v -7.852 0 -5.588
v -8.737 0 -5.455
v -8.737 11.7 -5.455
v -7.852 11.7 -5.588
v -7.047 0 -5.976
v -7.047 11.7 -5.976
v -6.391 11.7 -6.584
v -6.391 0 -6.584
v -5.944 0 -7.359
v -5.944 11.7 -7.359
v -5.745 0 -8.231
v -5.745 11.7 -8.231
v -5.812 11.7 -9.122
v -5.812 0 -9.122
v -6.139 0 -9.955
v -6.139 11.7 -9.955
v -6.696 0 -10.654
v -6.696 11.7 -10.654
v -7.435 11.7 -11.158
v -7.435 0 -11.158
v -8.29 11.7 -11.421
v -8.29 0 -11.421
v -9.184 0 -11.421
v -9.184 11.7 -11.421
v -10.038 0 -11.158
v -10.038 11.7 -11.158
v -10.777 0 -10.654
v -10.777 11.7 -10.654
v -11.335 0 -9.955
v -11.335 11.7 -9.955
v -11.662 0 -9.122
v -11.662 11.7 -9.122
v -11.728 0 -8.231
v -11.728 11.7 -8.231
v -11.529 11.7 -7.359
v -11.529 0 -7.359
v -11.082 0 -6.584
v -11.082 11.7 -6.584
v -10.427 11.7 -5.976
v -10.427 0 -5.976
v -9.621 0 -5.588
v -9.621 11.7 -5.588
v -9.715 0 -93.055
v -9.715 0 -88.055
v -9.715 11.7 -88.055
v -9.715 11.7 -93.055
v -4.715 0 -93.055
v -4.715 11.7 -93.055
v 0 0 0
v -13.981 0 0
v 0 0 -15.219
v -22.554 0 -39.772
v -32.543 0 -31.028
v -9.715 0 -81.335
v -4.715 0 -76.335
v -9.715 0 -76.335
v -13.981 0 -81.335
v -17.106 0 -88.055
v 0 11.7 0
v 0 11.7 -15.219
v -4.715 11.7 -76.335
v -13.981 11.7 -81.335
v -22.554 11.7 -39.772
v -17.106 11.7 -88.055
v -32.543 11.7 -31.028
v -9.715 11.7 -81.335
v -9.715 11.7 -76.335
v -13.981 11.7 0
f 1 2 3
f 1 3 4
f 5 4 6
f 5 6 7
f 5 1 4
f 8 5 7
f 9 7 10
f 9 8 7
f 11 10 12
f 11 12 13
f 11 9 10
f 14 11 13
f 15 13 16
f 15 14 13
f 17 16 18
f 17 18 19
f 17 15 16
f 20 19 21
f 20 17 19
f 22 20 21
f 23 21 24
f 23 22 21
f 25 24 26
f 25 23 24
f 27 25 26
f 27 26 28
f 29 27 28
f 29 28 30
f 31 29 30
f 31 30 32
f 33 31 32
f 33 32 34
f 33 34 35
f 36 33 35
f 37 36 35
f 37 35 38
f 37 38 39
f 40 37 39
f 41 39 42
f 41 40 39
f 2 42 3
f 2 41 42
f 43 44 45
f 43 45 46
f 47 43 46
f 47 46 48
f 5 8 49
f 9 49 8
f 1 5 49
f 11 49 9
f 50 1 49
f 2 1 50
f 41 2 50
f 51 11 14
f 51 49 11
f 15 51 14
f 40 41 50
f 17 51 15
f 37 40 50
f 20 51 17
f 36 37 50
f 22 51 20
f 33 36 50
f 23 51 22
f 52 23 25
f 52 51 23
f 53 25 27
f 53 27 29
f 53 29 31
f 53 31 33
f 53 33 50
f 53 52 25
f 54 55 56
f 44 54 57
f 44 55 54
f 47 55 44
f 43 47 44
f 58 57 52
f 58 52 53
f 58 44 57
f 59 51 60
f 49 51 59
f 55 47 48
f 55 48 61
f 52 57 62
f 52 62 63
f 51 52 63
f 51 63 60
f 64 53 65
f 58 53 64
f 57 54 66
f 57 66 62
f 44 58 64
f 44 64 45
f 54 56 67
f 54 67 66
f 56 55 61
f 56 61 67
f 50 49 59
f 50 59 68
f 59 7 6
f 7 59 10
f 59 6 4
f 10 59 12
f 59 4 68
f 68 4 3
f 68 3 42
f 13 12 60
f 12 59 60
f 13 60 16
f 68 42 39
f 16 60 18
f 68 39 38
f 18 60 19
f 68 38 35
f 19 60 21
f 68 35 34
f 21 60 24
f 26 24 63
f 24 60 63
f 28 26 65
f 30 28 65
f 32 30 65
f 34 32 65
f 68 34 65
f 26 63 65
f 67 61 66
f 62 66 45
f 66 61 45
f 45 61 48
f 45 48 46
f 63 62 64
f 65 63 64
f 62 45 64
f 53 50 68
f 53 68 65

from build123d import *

# Parameters (mm, degrees)
SKETCH1_R           = 3
BOSS_EXTRUDE2_DEPTH = 11.7


with BuildPart() as part:
    # Sketch1 → Boss-Extrude2 (new body)
    with BuildSketch(Plane(origin=(0, 0, 0), x_dir=(1, 0, 0), z_dir=(0, 1, 0))):
        Polygon((0, 0), (-13.980822987, 0), (-32.542943678, 31.028387767), (-17.105764768, 88.055142801), (-9.7150509, 88.055142801), (-9.7150509, 93.055142801), (-4.7150509, 93.055142801), (-4.7150509, 76.335429628), (-9.7150509, 76.335429628), (-9.7150509, 81.335429628), (-13.980822987, 81.335429628), (-22.554180854, 39.771961165), (0, 15.218862691), align=None)
        with Locations(Location((-8.736754508, 8.454923717, 0), (0, 0, 270))):
            Circle(SKETCH1_R, mode=Mode.SUBTRACT)
    extrude(amount=BOSS_EXTRUDE2_DEPTH)


solid = part.part
